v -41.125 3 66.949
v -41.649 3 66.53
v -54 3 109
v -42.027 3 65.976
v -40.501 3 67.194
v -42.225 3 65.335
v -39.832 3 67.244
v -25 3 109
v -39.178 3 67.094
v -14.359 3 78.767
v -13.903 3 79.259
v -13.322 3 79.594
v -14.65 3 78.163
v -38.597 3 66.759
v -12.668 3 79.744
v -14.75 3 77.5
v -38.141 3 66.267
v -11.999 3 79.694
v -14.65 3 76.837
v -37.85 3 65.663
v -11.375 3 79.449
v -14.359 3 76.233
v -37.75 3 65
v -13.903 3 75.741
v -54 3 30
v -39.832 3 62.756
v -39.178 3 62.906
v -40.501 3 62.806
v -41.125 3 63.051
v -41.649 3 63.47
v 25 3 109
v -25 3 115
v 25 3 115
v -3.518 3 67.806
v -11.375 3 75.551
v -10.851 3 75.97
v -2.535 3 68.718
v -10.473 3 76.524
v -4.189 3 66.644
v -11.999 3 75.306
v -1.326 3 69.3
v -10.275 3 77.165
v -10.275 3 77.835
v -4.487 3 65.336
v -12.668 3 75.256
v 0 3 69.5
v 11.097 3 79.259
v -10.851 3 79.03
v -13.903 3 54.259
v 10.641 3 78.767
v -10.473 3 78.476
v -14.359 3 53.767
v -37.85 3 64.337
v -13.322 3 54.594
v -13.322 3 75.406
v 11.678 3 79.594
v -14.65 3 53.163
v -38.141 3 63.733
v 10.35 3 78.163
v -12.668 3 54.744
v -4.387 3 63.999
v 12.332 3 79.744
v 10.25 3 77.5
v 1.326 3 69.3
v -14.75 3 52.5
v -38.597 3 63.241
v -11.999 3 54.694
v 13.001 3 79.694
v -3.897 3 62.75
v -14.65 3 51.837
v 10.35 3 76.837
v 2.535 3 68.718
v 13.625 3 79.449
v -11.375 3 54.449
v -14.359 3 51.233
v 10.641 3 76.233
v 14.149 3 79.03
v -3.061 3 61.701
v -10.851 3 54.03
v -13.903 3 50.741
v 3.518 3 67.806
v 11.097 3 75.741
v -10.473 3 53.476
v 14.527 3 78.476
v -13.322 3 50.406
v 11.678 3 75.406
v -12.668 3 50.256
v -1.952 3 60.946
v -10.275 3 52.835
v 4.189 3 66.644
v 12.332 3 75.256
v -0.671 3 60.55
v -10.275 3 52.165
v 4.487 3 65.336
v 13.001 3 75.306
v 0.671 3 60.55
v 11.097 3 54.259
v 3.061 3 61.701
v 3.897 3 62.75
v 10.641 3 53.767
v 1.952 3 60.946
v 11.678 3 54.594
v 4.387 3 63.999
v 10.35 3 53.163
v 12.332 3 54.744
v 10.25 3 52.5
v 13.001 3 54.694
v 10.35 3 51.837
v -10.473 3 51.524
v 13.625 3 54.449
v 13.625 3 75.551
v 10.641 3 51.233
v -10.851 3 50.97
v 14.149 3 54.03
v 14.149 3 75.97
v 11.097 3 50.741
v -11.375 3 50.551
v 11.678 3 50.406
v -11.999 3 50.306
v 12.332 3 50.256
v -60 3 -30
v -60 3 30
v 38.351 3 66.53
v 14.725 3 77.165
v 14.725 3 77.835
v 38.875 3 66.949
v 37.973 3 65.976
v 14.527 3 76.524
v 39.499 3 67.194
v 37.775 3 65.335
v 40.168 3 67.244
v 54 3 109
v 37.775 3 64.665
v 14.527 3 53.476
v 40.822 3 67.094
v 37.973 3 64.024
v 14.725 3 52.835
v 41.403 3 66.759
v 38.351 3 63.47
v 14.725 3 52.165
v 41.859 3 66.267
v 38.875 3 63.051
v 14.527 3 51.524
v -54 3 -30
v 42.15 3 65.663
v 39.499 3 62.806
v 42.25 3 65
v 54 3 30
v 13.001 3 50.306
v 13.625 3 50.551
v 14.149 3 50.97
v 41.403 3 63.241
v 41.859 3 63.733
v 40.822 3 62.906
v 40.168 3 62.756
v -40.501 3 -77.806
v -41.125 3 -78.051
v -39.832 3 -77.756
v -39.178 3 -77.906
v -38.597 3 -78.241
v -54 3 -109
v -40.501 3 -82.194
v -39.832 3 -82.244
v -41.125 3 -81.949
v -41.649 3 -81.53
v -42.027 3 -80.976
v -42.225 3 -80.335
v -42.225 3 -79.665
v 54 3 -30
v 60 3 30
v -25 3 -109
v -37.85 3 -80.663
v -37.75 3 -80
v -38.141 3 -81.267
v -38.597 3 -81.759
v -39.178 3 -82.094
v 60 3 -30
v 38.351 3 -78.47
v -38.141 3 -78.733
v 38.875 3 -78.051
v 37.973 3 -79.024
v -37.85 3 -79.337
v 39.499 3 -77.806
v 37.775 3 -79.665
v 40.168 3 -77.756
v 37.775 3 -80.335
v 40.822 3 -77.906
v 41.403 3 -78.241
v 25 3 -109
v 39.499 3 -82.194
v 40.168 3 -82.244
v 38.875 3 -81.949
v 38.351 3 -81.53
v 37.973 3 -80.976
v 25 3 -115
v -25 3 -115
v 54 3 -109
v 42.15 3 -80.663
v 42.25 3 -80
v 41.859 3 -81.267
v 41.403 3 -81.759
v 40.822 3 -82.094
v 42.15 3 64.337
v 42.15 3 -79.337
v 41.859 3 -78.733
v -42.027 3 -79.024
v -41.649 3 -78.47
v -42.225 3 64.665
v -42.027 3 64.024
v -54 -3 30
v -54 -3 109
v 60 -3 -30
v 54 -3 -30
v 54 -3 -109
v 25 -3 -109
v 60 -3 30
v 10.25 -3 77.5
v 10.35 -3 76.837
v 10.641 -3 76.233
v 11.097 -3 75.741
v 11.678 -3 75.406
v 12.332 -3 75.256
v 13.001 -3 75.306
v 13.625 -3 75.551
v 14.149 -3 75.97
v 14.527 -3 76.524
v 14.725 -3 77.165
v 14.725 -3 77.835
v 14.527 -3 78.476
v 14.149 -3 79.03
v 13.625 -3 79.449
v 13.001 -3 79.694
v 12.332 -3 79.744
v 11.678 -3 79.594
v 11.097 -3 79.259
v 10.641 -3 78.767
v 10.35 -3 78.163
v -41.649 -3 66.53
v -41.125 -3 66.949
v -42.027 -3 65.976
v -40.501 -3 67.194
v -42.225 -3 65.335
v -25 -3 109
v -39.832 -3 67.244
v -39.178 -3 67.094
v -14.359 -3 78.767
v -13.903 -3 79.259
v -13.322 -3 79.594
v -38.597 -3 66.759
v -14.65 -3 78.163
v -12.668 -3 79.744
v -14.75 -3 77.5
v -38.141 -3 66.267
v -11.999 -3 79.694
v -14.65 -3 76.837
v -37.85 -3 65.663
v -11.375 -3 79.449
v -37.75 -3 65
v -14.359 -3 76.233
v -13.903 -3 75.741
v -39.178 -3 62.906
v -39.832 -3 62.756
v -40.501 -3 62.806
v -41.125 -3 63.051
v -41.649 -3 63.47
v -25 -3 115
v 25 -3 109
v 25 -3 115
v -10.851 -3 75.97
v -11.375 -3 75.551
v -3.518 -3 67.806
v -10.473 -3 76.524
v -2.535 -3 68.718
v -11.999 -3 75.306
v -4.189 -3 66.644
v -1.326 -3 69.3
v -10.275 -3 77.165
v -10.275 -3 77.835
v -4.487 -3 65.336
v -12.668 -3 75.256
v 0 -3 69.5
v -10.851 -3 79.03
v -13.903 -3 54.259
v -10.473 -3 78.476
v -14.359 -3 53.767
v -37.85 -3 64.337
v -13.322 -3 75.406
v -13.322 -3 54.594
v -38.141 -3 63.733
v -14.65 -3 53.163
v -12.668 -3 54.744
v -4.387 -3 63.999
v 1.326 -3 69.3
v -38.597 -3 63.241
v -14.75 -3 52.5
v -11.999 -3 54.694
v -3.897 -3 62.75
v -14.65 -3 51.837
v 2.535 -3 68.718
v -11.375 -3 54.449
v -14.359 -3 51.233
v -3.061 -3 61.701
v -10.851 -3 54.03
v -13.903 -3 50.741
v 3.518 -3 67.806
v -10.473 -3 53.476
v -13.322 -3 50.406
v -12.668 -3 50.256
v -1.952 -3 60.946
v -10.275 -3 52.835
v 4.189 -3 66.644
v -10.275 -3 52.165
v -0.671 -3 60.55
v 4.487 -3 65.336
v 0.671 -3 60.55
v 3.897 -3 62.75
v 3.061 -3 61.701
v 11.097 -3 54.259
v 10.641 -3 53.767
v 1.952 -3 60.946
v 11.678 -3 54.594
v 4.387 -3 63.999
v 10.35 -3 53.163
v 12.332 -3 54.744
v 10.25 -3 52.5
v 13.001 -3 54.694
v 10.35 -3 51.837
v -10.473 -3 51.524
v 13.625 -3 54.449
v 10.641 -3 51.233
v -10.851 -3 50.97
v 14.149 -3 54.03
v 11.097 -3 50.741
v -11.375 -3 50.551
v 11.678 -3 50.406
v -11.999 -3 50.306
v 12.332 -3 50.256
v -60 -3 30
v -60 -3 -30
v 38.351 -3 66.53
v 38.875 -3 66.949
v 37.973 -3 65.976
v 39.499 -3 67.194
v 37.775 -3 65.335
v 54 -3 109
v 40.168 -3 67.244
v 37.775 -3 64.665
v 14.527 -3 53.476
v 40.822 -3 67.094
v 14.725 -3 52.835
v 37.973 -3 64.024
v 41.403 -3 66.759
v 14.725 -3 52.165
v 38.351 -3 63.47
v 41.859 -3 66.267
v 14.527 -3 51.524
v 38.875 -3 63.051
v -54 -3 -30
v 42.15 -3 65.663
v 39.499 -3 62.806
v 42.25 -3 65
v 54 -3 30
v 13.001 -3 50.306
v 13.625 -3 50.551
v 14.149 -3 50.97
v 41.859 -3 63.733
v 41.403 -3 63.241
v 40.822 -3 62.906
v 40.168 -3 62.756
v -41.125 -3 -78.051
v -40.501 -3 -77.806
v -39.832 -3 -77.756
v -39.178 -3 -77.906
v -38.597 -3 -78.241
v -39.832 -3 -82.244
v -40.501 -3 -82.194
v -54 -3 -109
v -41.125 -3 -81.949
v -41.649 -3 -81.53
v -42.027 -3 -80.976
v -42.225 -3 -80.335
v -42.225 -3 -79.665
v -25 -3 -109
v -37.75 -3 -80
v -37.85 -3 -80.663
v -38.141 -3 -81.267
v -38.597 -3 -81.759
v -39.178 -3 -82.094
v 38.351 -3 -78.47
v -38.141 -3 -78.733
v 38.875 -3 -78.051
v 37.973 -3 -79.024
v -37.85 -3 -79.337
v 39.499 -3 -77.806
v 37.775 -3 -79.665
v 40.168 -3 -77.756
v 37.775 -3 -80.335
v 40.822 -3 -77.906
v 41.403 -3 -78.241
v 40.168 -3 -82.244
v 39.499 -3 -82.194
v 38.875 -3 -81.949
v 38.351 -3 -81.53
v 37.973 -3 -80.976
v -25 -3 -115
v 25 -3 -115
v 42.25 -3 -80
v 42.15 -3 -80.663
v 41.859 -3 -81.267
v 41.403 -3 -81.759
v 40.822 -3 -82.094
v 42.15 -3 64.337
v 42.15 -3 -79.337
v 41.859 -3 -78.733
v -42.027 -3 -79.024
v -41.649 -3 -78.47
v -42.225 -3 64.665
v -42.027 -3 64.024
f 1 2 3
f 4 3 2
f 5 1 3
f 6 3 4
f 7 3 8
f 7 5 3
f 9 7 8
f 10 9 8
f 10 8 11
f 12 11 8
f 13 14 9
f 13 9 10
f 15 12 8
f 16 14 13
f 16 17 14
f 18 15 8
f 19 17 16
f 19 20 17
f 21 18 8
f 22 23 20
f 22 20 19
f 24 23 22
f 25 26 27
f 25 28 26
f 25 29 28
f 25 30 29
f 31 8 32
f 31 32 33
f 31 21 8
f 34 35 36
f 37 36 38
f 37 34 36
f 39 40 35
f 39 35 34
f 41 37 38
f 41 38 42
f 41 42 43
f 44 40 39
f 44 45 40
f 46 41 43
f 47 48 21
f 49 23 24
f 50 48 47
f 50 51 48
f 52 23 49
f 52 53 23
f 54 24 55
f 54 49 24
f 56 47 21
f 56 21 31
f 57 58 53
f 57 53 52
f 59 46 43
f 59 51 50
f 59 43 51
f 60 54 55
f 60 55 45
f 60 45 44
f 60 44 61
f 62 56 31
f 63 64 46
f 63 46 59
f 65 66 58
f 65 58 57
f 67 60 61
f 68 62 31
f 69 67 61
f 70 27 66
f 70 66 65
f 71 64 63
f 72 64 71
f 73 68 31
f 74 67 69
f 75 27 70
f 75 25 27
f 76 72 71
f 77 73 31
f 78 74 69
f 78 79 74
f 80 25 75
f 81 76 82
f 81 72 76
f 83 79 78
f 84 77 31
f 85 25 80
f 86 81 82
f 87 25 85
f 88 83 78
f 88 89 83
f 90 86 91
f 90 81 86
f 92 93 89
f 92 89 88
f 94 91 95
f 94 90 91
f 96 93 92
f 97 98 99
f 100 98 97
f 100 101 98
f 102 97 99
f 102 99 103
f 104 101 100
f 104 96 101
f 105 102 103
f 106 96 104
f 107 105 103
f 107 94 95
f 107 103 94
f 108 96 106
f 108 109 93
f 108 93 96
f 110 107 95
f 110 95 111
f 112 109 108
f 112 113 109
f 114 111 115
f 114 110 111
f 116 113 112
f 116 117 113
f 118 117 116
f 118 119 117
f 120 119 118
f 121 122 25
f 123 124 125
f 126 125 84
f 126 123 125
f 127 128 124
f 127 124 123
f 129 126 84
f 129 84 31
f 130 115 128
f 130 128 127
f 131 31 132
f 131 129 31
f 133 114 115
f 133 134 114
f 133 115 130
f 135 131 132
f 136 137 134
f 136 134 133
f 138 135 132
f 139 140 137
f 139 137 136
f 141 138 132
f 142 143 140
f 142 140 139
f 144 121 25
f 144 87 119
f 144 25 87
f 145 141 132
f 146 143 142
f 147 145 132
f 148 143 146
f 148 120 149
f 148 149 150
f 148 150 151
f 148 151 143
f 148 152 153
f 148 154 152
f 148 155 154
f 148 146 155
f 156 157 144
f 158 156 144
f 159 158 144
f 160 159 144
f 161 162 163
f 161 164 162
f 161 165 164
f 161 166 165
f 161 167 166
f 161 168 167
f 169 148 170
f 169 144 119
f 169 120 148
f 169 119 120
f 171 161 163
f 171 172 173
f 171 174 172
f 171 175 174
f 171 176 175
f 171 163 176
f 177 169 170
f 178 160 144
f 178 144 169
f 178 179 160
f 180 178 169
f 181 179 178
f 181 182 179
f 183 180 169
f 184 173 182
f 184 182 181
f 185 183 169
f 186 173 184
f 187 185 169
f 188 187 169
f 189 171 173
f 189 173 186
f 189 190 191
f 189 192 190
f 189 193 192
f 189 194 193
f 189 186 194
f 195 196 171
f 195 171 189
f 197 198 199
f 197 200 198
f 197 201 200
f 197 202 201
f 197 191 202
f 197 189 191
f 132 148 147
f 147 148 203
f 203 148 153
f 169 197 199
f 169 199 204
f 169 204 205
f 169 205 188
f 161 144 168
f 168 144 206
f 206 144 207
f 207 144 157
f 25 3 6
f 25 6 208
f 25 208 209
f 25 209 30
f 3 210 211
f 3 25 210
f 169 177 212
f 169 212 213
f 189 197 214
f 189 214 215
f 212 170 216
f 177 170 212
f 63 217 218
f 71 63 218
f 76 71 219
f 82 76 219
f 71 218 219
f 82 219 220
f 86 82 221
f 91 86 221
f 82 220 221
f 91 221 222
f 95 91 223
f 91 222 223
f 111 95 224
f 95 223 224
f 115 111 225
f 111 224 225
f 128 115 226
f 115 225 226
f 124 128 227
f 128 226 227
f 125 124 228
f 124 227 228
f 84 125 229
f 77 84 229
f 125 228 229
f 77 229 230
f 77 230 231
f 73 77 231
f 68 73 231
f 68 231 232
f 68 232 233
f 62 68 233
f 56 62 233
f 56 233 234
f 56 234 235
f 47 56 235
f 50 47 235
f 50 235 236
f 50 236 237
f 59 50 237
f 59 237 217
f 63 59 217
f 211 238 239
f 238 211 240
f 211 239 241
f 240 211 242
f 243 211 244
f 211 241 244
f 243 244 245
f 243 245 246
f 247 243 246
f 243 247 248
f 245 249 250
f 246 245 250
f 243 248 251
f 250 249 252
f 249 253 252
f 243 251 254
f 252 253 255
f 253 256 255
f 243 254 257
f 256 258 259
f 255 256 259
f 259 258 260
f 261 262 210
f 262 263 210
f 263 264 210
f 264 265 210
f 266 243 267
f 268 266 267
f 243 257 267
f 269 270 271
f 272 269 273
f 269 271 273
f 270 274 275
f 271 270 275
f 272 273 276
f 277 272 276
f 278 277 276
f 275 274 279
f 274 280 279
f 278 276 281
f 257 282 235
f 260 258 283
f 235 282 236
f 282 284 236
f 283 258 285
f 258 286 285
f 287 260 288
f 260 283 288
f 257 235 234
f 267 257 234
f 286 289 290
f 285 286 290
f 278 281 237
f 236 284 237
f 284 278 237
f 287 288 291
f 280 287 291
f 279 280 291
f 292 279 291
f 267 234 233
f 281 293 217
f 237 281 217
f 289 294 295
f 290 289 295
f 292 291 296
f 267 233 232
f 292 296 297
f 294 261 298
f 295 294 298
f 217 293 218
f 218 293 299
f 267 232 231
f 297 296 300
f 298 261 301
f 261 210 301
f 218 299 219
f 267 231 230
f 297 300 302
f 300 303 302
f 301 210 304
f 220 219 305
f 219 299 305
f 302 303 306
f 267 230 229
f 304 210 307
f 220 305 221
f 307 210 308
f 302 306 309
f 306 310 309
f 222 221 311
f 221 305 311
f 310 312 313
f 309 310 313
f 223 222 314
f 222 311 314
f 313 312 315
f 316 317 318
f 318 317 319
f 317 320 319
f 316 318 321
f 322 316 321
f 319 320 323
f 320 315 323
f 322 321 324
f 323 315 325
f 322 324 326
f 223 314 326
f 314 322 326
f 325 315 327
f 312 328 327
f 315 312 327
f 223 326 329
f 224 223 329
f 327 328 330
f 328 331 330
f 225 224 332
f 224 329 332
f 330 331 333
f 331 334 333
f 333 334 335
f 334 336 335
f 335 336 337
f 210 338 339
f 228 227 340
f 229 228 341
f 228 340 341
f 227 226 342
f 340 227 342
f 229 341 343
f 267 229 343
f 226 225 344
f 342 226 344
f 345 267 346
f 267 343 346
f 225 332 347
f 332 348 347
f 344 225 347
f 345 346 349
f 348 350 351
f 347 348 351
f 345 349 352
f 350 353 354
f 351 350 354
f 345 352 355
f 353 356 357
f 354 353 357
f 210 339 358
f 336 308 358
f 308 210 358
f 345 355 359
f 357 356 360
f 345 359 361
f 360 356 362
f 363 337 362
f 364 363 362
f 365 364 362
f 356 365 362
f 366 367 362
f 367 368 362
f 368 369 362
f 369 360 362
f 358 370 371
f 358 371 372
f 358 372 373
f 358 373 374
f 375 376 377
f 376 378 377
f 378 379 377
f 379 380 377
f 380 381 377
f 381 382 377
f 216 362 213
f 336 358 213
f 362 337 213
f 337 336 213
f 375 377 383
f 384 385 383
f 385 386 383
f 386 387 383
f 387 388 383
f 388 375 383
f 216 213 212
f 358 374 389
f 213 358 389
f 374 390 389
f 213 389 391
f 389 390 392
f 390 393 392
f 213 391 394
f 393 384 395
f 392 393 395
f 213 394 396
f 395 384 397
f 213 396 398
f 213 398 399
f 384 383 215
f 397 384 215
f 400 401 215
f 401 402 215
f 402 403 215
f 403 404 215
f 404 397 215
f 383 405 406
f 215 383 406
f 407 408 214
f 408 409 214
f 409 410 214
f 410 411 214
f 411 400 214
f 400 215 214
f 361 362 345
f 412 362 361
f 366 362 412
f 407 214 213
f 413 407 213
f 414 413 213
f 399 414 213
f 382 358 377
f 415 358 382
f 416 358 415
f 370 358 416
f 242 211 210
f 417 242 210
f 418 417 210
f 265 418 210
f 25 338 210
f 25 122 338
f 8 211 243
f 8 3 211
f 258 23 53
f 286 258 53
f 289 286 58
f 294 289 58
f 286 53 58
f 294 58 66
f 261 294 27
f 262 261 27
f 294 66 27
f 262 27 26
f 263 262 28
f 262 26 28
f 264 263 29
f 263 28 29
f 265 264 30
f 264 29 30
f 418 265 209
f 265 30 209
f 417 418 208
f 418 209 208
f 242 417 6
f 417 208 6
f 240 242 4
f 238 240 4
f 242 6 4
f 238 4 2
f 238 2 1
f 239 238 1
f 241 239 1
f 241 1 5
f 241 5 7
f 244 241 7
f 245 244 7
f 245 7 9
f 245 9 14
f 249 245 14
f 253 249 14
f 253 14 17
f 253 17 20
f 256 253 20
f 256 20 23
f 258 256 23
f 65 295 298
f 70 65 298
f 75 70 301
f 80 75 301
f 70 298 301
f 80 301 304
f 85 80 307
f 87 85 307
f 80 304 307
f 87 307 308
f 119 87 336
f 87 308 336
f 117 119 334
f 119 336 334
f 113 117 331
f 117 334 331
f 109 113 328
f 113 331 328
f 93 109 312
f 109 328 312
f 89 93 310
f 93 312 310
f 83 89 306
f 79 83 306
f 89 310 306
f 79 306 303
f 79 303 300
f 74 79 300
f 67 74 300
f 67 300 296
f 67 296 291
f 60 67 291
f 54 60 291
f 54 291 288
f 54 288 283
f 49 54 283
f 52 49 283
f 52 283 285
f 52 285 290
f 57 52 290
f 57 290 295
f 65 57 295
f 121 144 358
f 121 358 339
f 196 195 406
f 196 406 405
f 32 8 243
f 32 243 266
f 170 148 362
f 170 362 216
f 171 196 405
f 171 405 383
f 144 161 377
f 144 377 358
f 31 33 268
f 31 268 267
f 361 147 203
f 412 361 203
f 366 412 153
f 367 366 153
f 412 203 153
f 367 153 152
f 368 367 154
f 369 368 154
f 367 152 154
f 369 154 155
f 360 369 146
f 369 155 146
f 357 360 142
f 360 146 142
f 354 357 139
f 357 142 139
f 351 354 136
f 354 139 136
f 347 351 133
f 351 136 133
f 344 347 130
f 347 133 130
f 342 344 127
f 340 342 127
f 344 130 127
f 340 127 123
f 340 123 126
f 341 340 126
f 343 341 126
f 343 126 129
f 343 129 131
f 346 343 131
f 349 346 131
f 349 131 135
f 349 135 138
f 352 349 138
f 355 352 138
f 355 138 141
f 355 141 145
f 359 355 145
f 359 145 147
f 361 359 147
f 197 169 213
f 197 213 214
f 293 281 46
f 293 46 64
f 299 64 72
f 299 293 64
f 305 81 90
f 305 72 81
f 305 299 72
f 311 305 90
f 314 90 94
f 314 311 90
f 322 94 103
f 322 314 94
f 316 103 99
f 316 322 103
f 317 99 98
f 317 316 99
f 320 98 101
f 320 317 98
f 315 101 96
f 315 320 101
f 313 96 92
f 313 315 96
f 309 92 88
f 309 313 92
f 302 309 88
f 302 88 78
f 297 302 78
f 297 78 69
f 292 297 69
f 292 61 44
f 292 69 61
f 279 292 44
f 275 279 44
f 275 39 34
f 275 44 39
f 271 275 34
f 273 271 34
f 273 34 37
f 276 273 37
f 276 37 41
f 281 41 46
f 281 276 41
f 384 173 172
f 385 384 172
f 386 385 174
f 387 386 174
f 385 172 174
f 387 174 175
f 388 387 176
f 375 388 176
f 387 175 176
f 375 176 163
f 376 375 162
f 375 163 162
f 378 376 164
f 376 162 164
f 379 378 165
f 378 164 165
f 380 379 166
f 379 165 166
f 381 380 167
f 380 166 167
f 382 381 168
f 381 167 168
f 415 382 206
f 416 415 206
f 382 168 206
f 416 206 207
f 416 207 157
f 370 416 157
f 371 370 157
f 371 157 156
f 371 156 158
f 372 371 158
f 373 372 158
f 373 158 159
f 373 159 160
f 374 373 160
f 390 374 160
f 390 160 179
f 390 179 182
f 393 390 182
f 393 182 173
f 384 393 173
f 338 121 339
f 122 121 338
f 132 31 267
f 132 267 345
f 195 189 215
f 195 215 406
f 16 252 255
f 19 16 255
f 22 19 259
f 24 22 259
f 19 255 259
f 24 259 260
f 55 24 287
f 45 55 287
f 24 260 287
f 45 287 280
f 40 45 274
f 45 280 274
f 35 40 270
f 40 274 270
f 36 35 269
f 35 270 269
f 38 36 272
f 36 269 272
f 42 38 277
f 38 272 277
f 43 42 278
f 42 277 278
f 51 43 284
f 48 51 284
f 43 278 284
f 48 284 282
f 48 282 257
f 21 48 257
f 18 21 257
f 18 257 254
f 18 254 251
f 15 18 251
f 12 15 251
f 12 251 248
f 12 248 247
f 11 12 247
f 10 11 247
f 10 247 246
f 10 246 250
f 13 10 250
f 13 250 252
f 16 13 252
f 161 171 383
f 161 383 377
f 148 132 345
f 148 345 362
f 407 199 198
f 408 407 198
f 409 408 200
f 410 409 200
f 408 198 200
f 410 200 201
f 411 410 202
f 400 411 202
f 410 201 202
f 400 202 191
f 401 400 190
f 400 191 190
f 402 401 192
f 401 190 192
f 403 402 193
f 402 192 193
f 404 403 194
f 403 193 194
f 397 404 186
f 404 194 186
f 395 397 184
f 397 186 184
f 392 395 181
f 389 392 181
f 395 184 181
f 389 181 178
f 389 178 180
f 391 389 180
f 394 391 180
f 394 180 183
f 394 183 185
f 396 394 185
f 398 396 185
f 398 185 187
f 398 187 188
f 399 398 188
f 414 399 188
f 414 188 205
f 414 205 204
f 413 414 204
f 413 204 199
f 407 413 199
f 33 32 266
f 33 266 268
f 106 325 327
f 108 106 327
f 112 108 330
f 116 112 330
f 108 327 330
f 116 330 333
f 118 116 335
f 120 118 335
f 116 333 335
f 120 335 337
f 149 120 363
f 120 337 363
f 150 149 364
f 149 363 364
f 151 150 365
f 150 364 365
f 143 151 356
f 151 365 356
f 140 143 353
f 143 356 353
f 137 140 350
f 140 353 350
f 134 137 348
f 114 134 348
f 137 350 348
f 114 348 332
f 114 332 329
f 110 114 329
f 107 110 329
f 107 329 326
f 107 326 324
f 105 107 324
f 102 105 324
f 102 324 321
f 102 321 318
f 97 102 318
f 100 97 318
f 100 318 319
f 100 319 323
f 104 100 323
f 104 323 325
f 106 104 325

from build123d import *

# Parameters (mm, degrees)
SALIENTE_EXTRUIR1_DEPTH      = 3
CORTAR_EXTRUIR1_DEPTH        = 130.745905523
CORTAR_EXTRUIR1_DEPTH_BACK   = 130.745905523
CROQUIS2_R                   = 4.5
TALADRO_DE_MARGEN_PARA_M42_D = 4.5
TALADRO_DE_MARGEN_PARA_M41_D = 4.5


with BuildPart() as part:
    # Croquis1 → Saliente-Extruir1 (new, symmetric)
    with BuildSketch(Plane(origin=(0, 0, 0), x_dir=(1, 0, 0), z_dir=(0, 1, 0))):
        Polygon((-54, -109), (-25, -109), (-25, -115), (25, -115), (25, -109), (54, -109), (54, -30), (60, -30), (60, 30), (54, 30), (54, 109), (25, 109), (25, 115), (-25, 115), (-25, 109), (-54, 109), (-54, 30), (-60, 30), (-60, -30), (-54, -30), align=None)
    extrude(amount=SALIENTE_EXTRUIR1_DEPTH, both=True)

    # Croquis2 → Cortar-Extruir1 (cut, two sides: drawn at the far end of the back side and taken through both)
    with BuildSketch(Plane(origin=(0, 0, 0), x_dir=(1, 0, 0), z_dir=(0, 1, 0)).offset(-CORTAR_EXTRUIR1_DEPTH_BACK)):
        with Locations(Location((0, -65, 0), (0, 0, 270))):
            Circle(CROQUIS2_R)
    extrude(amount=CORTAR_EXTRUIR1_DEPTH + CORTAR_EXTRUIR1_DEPTH_BACK, mode=Mode.SUBTRACT)

    # Taladro de margen para M42 (through all)
    with Locations(Plane(origin=(0, 3, 0), x_dir=(1, 0, 0), z_dir=(0, 1, 0))):
        with Locations((12.5, -77.5), (-12.5, -77.5), (12.5, -52.5), (-12.5, -52.5)):
            Hole(TALADRO_DE_MARGEN_PARA_M42_D / 2)

    # Taladro de margen para M41 (through all)
    with Locations(Plane(origin=(0, -3, 0), x_dir=(-1, 0, 0), z_dir=(0, -1, 0))):
        with Locations((40, 80), (-40, 80), (40, -65), (-40, -65)):
            Hole(TALADRO_DE_MARGEN_PARA_M41_D / 2)


solid = part.part
